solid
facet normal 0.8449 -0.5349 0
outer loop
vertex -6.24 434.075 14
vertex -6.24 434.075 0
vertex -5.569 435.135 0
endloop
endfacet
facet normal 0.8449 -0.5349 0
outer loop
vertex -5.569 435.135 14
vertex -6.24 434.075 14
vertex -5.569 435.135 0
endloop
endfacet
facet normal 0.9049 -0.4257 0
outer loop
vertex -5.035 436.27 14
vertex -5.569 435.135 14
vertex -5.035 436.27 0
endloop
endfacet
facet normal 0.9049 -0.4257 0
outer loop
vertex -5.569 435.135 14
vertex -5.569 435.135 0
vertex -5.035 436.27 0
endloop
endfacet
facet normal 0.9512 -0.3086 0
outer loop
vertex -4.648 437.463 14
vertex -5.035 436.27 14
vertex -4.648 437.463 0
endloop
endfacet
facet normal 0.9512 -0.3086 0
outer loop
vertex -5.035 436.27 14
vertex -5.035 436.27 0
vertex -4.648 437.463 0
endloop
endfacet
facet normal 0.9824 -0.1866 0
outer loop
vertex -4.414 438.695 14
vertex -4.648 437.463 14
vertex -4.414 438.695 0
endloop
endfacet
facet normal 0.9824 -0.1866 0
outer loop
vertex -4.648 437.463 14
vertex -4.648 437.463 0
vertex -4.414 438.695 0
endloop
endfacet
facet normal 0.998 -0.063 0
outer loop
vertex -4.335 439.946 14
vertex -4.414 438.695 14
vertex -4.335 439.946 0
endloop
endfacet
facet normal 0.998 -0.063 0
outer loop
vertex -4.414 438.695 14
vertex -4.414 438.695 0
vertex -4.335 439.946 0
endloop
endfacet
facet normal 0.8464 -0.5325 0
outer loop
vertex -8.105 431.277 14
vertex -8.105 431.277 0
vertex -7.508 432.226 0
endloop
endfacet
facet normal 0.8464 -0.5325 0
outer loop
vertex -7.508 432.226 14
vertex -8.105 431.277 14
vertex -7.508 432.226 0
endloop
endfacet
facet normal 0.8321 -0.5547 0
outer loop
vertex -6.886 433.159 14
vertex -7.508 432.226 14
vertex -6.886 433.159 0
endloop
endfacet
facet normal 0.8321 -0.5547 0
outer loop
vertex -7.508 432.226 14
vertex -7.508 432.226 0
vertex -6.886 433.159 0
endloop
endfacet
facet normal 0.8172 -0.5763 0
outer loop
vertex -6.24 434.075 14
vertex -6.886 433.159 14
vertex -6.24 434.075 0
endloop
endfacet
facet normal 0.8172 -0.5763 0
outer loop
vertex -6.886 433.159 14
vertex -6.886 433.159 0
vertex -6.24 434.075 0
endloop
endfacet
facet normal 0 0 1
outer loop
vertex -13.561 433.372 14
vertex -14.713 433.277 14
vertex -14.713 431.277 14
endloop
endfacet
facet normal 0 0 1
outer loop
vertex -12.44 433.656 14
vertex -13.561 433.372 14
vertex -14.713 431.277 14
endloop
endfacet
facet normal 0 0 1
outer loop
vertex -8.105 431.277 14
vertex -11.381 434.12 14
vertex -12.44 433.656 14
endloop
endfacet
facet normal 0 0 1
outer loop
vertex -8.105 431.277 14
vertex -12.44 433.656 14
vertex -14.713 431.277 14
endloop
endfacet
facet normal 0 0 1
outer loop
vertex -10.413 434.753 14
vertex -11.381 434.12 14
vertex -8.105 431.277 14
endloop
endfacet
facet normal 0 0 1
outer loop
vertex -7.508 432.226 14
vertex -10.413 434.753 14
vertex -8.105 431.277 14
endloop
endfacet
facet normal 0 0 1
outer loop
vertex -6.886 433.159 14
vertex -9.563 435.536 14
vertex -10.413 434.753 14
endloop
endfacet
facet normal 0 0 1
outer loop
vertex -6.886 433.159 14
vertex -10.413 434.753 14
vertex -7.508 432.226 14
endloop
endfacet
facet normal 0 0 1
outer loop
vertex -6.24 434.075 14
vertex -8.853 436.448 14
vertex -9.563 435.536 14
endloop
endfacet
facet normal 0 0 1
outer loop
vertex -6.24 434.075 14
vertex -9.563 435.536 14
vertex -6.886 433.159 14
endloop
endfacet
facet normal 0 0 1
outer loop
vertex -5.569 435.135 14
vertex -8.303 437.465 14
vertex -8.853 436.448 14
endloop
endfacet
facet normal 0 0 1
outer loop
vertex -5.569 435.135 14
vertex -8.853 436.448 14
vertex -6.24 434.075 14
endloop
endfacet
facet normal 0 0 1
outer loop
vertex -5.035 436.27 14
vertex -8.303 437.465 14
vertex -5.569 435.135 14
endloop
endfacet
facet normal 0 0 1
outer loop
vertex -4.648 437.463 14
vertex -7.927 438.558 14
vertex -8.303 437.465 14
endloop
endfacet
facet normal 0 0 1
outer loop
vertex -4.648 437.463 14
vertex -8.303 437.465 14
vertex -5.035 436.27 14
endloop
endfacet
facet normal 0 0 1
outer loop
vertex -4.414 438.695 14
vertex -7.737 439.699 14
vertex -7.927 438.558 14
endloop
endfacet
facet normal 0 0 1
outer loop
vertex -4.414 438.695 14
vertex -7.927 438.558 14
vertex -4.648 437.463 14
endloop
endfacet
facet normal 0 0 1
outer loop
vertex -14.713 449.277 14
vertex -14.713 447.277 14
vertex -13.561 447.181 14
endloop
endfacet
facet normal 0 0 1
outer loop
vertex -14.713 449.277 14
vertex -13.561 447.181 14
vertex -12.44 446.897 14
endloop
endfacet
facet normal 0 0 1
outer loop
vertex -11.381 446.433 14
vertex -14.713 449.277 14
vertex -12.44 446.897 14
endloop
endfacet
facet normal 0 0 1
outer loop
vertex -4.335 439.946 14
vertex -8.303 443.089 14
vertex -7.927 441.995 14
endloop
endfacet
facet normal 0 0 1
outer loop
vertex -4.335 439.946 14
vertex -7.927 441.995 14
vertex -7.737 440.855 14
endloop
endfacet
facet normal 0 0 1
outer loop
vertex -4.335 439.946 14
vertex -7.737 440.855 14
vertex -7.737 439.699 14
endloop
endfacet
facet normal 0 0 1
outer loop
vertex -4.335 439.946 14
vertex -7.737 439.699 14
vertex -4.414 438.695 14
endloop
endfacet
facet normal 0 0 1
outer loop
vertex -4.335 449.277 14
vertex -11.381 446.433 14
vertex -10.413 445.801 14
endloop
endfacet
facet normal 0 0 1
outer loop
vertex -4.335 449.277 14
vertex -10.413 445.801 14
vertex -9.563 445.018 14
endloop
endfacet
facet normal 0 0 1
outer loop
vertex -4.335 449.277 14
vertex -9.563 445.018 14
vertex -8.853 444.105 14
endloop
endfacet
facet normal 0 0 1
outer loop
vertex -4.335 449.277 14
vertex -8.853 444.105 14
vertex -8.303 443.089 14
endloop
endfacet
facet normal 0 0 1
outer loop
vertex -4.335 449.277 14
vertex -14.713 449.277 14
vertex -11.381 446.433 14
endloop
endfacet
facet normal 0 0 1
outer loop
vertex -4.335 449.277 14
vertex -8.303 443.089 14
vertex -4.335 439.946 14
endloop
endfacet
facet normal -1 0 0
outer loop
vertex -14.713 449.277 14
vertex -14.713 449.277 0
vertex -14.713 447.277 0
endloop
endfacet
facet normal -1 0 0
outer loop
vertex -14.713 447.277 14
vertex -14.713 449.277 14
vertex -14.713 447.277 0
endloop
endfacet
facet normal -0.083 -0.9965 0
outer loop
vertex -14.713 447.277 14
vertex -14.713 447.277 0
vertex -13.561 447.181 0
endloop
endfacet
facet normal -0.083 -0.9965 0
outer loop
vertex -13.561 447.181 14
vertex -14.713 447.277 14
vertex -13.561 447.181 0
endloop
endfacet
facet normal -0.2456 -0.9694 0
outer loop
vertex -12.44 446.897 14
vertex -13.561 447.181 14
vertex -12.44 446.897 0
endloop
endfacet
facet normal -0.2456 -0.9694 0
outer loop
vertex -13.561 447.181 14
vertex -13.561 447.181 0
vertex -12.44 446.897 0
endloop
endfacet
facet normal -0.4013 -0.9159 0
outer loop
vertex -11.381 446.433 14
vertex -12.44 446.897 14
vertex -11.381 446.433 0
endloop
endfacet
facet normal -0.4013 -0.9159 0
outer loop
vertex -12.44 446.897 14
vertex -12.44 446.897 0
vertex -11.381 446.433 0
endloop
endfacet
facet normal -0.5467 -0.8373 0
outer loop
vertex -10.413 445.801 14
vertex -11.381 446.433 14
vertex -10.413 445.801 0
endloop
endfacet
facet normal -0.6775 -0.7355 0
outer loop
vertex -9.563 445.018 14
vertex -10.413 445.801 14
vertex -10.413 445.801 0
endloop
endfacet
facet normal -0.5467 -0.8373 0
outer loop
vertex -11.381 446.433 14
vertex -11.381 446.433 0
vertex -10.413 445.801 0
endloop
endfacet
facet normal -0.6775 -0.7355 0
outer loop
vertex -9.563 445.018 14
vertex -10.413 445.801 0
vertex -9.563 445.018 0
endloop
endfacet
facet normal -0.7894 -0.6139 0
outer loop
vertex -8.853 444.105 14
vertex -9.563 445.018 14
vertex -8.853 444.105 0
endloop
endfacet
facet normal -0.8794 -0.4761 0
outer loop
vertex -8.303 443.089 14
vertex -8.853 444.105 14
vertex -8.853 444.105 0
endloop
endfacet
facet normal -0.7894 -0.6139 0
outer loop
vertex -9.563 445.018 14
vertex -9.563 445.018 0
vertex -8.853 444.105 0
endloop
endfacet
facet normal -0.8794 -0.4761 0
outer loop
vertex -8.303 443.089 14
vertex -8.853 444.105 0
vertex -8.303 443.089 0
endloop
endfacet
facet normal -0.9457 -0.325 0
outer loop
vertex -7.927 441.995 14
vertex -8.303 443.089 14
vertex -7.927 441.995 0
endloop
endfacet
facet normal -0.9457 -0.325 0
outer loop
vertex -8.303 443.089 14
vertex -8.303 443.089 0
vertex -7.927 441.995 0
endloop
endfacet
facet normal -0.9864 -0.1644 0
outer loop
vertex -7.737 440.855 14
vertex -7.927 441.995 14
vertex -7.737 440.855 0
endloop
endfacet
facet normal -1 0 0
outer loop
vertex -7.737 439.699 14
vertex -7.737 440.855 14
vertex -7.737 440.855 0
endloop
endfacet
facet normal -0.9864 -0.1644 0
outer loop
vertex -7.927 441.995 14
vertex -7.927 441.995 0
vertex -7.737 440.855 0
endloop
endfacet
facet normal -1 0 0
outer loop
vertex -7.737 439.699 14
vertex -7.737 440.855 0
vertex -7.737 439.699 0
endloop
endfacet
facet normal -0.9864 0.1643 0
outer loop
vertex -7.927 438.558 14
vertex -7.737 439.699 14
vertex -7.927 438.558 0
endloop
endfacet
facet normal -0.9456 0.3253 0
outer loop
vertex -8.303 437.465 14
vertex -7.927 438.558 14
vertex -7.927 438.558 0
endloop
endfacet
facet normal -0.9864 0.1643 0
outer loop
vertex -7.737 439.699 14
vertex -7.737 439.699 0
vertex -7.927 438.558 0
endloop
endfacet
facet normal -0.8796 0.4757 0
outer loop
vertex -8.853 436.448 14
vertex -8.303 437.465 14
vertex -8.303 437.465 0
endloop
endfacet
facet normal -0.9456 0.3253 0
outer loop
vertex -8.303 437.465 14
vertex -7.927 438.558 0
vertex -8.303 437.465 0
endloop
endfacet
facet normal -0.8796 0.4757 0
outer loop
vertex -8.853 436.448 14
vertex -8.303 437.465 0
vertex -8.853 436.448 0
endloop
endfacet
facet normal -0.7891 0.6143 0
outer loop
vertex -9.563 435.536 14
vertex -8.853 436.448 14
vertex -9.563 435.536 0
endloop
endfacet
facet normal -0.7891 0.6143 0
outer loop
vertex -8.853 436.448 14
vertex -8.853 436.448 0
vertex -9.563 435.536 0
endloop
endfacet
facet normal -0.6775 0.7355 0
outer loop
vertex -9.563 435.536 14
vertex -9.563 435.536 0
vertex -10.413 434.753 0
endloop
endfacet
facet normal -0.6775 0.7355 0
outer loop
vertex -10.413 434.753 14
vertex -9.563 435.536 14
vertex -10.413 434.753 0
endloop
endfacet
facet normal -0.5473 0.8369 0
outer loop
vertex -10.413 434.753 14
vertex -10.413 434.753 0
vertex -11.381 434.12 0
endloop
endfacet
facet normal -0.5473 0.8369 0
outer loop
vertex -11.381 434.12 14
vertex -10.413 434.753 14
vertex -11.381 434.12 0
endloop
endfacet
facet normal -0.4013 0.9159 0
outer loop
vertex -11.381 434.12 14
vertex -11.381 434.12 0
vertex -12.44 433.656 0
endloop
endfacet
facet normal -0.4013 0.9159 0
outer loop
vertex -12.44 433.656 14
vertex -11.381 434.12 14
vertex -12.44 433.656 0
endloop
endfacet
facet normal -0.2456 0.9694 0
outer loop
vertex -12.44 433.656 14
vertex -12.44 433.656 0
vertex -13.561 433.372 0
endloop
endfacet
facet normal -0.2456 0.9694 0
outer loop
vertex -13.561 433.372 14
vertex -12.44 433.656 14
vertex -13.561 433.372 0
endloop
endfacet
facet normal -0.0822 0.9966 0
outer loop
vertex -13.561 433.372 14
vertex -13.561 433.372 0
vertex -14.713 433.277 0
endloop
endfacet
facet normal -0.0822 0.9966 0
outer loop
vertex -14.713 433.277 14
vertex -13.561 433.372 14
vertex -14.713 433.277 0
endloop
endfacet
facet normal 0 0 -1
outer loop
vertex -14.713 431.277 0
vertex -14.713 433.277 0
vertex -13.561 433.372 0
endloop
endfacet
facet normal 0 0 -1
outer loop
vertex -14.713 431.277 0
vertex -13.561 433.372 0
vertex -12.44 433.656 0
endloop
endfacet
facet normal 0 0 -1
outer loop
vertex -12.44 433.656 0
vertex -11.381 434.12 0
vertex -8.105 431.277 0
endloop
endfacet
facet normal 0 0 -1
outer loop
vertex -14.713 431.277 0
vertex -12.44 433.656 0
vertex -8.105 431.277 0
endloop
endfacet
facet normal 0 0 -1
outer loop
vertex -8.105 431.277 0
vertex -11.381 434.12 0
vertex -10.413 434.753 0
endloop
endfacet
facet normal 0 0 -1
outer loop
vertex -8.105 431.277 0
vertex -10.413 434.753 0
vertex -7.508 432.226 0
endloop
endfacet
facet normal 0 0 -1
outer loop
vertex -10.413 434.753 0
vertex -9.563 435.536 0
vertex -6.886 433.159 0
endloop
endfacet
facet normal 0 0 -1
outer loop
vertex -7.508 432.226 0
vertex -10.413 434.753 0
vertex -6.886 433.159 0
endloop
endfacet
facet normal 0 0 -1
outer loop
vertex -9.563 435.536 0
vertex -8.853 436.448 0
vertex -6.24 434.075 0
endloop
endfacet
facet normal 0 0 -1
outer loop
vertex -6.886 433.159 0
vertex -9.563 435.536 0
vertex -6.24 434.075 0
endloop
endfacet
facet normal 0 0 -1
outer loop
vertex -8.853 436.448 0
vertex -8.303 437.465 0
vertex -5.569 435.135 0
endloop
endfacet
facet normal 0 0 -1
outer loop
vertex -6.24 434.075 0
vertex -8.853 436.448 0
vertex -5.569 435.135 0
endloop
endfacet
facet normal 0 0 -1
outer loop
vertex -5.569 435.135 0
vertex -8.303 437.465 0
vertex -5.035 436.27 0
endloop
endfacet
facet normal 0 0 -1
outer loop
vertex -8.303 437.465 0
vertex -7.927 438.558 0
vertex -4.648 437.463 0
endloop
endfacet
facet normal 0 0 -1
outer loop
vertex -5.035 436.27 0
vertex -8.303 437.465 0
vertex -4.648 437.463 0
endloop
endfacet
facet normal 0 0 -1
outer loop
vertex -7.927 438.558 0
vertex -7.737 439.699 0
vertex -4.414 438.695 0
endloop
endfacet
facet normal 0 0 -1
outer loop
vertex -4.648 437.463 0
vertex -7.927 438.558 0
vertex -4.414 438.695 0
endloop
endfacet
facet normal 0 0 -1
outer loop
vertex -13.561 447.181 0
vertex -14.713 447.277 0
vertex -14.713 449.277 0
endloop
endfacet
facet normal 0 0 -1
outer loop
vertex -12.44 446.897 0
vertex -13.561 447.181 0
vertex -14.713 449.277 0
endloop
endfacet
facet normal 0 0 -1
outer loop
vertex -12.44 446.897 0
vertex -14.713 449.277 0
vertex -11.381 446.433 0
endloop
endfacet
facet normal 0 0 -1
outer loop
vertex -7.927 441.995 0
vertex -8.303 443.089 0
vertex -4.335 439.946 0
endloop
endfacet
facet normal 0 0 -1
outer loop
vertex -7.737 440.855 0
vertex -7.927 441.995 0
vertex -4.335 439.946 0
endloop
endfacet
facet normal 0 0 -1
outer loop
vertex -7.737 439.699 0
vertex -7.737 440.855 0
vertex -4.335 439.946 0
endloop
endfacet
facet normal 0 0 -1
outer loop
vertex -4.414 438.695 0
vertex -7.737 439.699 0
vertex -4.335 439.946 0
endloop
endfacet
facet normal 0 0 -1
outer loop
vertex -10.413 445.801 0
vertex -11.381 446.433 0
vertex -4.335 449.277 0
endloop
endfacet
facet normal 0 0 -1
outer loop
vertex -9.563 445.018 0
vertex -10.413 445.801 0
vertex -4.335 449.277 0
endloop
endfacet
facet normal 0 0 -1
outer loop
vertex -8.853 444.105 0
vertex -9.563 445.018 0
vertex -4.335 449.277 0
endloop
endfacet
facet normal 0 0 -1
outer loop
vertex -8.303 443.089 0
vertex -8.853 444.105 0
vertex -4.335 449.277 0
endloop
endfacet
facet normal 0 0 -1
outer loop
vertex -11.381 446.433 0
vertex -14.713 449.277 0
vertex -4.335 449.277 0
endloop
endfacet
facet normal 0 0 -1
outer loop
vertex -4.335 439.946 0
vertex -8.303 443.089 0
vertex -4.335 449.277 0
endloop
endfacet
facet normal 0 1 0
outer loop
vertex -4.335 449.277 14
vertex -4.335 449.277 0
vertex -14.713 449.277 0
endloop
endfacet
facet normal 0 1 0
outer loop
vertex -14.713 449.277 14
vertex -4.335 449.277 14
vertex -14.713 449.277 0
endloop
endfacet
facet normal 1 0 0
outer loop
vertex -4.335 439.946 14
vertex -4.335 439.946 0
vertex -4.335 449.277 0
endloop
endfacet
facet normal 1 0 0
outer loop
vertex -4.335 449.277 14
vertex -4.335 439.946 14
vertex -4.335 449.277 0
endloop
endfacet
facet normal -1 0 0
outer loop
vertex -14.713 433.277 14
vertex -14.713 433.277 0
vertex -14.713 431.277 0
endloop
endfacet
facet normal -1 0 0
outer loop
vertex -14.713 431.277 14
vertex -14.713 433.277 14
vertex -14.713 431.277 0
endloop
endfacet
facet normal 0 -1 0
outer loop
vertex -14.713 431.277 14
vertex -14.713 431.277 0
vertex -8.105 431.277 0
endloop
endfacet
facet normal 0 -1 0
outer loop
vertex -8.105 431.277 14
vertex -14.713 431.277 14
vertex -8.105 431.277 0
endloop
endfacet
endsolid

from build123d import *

# Parameters (mm, degrees)
EXTRUDE_1_DEPTH = 14


with BuildPart() as part:
    # 草图1 → 凸台-拉伸1 (new body)
    with BuildSketch(Plane.XY):
        with BuildLine():
            Line((-4.335050742, 439.946209227), (-4.335050742, 449.276757584))
            Line((-4.335050742, 449.276757584), (-14.712951443, 449.276757584))
            Line((-14.712951443, 449.276757584), (-14.712951443, 447.276757584))
            ThreePointArc((-14.712951443, 447.276757584), (-7.712951443, 440.276757584), (-14.712951443, 433.276757584))
            Line((-14.712951443, 433.276757584), (-14.712951443, 431.276757584))
            Line((-14.712951443, 431.276757584), (-8.105031432, 431.276757584))
            ThreePointArc((-8.105031432, 431.276757584), (-7.200115769, 432.694505685), (-6.239812646, 434.075338748))
            ThreePointArc((-6.239812646, 434.075338748), (-4.823153429, 436.860142228), (-4.335050742, 439.946209227))
        make_face()
    extrude(amount=EXTRUDE_1_DEPTH)


solid = part.part
